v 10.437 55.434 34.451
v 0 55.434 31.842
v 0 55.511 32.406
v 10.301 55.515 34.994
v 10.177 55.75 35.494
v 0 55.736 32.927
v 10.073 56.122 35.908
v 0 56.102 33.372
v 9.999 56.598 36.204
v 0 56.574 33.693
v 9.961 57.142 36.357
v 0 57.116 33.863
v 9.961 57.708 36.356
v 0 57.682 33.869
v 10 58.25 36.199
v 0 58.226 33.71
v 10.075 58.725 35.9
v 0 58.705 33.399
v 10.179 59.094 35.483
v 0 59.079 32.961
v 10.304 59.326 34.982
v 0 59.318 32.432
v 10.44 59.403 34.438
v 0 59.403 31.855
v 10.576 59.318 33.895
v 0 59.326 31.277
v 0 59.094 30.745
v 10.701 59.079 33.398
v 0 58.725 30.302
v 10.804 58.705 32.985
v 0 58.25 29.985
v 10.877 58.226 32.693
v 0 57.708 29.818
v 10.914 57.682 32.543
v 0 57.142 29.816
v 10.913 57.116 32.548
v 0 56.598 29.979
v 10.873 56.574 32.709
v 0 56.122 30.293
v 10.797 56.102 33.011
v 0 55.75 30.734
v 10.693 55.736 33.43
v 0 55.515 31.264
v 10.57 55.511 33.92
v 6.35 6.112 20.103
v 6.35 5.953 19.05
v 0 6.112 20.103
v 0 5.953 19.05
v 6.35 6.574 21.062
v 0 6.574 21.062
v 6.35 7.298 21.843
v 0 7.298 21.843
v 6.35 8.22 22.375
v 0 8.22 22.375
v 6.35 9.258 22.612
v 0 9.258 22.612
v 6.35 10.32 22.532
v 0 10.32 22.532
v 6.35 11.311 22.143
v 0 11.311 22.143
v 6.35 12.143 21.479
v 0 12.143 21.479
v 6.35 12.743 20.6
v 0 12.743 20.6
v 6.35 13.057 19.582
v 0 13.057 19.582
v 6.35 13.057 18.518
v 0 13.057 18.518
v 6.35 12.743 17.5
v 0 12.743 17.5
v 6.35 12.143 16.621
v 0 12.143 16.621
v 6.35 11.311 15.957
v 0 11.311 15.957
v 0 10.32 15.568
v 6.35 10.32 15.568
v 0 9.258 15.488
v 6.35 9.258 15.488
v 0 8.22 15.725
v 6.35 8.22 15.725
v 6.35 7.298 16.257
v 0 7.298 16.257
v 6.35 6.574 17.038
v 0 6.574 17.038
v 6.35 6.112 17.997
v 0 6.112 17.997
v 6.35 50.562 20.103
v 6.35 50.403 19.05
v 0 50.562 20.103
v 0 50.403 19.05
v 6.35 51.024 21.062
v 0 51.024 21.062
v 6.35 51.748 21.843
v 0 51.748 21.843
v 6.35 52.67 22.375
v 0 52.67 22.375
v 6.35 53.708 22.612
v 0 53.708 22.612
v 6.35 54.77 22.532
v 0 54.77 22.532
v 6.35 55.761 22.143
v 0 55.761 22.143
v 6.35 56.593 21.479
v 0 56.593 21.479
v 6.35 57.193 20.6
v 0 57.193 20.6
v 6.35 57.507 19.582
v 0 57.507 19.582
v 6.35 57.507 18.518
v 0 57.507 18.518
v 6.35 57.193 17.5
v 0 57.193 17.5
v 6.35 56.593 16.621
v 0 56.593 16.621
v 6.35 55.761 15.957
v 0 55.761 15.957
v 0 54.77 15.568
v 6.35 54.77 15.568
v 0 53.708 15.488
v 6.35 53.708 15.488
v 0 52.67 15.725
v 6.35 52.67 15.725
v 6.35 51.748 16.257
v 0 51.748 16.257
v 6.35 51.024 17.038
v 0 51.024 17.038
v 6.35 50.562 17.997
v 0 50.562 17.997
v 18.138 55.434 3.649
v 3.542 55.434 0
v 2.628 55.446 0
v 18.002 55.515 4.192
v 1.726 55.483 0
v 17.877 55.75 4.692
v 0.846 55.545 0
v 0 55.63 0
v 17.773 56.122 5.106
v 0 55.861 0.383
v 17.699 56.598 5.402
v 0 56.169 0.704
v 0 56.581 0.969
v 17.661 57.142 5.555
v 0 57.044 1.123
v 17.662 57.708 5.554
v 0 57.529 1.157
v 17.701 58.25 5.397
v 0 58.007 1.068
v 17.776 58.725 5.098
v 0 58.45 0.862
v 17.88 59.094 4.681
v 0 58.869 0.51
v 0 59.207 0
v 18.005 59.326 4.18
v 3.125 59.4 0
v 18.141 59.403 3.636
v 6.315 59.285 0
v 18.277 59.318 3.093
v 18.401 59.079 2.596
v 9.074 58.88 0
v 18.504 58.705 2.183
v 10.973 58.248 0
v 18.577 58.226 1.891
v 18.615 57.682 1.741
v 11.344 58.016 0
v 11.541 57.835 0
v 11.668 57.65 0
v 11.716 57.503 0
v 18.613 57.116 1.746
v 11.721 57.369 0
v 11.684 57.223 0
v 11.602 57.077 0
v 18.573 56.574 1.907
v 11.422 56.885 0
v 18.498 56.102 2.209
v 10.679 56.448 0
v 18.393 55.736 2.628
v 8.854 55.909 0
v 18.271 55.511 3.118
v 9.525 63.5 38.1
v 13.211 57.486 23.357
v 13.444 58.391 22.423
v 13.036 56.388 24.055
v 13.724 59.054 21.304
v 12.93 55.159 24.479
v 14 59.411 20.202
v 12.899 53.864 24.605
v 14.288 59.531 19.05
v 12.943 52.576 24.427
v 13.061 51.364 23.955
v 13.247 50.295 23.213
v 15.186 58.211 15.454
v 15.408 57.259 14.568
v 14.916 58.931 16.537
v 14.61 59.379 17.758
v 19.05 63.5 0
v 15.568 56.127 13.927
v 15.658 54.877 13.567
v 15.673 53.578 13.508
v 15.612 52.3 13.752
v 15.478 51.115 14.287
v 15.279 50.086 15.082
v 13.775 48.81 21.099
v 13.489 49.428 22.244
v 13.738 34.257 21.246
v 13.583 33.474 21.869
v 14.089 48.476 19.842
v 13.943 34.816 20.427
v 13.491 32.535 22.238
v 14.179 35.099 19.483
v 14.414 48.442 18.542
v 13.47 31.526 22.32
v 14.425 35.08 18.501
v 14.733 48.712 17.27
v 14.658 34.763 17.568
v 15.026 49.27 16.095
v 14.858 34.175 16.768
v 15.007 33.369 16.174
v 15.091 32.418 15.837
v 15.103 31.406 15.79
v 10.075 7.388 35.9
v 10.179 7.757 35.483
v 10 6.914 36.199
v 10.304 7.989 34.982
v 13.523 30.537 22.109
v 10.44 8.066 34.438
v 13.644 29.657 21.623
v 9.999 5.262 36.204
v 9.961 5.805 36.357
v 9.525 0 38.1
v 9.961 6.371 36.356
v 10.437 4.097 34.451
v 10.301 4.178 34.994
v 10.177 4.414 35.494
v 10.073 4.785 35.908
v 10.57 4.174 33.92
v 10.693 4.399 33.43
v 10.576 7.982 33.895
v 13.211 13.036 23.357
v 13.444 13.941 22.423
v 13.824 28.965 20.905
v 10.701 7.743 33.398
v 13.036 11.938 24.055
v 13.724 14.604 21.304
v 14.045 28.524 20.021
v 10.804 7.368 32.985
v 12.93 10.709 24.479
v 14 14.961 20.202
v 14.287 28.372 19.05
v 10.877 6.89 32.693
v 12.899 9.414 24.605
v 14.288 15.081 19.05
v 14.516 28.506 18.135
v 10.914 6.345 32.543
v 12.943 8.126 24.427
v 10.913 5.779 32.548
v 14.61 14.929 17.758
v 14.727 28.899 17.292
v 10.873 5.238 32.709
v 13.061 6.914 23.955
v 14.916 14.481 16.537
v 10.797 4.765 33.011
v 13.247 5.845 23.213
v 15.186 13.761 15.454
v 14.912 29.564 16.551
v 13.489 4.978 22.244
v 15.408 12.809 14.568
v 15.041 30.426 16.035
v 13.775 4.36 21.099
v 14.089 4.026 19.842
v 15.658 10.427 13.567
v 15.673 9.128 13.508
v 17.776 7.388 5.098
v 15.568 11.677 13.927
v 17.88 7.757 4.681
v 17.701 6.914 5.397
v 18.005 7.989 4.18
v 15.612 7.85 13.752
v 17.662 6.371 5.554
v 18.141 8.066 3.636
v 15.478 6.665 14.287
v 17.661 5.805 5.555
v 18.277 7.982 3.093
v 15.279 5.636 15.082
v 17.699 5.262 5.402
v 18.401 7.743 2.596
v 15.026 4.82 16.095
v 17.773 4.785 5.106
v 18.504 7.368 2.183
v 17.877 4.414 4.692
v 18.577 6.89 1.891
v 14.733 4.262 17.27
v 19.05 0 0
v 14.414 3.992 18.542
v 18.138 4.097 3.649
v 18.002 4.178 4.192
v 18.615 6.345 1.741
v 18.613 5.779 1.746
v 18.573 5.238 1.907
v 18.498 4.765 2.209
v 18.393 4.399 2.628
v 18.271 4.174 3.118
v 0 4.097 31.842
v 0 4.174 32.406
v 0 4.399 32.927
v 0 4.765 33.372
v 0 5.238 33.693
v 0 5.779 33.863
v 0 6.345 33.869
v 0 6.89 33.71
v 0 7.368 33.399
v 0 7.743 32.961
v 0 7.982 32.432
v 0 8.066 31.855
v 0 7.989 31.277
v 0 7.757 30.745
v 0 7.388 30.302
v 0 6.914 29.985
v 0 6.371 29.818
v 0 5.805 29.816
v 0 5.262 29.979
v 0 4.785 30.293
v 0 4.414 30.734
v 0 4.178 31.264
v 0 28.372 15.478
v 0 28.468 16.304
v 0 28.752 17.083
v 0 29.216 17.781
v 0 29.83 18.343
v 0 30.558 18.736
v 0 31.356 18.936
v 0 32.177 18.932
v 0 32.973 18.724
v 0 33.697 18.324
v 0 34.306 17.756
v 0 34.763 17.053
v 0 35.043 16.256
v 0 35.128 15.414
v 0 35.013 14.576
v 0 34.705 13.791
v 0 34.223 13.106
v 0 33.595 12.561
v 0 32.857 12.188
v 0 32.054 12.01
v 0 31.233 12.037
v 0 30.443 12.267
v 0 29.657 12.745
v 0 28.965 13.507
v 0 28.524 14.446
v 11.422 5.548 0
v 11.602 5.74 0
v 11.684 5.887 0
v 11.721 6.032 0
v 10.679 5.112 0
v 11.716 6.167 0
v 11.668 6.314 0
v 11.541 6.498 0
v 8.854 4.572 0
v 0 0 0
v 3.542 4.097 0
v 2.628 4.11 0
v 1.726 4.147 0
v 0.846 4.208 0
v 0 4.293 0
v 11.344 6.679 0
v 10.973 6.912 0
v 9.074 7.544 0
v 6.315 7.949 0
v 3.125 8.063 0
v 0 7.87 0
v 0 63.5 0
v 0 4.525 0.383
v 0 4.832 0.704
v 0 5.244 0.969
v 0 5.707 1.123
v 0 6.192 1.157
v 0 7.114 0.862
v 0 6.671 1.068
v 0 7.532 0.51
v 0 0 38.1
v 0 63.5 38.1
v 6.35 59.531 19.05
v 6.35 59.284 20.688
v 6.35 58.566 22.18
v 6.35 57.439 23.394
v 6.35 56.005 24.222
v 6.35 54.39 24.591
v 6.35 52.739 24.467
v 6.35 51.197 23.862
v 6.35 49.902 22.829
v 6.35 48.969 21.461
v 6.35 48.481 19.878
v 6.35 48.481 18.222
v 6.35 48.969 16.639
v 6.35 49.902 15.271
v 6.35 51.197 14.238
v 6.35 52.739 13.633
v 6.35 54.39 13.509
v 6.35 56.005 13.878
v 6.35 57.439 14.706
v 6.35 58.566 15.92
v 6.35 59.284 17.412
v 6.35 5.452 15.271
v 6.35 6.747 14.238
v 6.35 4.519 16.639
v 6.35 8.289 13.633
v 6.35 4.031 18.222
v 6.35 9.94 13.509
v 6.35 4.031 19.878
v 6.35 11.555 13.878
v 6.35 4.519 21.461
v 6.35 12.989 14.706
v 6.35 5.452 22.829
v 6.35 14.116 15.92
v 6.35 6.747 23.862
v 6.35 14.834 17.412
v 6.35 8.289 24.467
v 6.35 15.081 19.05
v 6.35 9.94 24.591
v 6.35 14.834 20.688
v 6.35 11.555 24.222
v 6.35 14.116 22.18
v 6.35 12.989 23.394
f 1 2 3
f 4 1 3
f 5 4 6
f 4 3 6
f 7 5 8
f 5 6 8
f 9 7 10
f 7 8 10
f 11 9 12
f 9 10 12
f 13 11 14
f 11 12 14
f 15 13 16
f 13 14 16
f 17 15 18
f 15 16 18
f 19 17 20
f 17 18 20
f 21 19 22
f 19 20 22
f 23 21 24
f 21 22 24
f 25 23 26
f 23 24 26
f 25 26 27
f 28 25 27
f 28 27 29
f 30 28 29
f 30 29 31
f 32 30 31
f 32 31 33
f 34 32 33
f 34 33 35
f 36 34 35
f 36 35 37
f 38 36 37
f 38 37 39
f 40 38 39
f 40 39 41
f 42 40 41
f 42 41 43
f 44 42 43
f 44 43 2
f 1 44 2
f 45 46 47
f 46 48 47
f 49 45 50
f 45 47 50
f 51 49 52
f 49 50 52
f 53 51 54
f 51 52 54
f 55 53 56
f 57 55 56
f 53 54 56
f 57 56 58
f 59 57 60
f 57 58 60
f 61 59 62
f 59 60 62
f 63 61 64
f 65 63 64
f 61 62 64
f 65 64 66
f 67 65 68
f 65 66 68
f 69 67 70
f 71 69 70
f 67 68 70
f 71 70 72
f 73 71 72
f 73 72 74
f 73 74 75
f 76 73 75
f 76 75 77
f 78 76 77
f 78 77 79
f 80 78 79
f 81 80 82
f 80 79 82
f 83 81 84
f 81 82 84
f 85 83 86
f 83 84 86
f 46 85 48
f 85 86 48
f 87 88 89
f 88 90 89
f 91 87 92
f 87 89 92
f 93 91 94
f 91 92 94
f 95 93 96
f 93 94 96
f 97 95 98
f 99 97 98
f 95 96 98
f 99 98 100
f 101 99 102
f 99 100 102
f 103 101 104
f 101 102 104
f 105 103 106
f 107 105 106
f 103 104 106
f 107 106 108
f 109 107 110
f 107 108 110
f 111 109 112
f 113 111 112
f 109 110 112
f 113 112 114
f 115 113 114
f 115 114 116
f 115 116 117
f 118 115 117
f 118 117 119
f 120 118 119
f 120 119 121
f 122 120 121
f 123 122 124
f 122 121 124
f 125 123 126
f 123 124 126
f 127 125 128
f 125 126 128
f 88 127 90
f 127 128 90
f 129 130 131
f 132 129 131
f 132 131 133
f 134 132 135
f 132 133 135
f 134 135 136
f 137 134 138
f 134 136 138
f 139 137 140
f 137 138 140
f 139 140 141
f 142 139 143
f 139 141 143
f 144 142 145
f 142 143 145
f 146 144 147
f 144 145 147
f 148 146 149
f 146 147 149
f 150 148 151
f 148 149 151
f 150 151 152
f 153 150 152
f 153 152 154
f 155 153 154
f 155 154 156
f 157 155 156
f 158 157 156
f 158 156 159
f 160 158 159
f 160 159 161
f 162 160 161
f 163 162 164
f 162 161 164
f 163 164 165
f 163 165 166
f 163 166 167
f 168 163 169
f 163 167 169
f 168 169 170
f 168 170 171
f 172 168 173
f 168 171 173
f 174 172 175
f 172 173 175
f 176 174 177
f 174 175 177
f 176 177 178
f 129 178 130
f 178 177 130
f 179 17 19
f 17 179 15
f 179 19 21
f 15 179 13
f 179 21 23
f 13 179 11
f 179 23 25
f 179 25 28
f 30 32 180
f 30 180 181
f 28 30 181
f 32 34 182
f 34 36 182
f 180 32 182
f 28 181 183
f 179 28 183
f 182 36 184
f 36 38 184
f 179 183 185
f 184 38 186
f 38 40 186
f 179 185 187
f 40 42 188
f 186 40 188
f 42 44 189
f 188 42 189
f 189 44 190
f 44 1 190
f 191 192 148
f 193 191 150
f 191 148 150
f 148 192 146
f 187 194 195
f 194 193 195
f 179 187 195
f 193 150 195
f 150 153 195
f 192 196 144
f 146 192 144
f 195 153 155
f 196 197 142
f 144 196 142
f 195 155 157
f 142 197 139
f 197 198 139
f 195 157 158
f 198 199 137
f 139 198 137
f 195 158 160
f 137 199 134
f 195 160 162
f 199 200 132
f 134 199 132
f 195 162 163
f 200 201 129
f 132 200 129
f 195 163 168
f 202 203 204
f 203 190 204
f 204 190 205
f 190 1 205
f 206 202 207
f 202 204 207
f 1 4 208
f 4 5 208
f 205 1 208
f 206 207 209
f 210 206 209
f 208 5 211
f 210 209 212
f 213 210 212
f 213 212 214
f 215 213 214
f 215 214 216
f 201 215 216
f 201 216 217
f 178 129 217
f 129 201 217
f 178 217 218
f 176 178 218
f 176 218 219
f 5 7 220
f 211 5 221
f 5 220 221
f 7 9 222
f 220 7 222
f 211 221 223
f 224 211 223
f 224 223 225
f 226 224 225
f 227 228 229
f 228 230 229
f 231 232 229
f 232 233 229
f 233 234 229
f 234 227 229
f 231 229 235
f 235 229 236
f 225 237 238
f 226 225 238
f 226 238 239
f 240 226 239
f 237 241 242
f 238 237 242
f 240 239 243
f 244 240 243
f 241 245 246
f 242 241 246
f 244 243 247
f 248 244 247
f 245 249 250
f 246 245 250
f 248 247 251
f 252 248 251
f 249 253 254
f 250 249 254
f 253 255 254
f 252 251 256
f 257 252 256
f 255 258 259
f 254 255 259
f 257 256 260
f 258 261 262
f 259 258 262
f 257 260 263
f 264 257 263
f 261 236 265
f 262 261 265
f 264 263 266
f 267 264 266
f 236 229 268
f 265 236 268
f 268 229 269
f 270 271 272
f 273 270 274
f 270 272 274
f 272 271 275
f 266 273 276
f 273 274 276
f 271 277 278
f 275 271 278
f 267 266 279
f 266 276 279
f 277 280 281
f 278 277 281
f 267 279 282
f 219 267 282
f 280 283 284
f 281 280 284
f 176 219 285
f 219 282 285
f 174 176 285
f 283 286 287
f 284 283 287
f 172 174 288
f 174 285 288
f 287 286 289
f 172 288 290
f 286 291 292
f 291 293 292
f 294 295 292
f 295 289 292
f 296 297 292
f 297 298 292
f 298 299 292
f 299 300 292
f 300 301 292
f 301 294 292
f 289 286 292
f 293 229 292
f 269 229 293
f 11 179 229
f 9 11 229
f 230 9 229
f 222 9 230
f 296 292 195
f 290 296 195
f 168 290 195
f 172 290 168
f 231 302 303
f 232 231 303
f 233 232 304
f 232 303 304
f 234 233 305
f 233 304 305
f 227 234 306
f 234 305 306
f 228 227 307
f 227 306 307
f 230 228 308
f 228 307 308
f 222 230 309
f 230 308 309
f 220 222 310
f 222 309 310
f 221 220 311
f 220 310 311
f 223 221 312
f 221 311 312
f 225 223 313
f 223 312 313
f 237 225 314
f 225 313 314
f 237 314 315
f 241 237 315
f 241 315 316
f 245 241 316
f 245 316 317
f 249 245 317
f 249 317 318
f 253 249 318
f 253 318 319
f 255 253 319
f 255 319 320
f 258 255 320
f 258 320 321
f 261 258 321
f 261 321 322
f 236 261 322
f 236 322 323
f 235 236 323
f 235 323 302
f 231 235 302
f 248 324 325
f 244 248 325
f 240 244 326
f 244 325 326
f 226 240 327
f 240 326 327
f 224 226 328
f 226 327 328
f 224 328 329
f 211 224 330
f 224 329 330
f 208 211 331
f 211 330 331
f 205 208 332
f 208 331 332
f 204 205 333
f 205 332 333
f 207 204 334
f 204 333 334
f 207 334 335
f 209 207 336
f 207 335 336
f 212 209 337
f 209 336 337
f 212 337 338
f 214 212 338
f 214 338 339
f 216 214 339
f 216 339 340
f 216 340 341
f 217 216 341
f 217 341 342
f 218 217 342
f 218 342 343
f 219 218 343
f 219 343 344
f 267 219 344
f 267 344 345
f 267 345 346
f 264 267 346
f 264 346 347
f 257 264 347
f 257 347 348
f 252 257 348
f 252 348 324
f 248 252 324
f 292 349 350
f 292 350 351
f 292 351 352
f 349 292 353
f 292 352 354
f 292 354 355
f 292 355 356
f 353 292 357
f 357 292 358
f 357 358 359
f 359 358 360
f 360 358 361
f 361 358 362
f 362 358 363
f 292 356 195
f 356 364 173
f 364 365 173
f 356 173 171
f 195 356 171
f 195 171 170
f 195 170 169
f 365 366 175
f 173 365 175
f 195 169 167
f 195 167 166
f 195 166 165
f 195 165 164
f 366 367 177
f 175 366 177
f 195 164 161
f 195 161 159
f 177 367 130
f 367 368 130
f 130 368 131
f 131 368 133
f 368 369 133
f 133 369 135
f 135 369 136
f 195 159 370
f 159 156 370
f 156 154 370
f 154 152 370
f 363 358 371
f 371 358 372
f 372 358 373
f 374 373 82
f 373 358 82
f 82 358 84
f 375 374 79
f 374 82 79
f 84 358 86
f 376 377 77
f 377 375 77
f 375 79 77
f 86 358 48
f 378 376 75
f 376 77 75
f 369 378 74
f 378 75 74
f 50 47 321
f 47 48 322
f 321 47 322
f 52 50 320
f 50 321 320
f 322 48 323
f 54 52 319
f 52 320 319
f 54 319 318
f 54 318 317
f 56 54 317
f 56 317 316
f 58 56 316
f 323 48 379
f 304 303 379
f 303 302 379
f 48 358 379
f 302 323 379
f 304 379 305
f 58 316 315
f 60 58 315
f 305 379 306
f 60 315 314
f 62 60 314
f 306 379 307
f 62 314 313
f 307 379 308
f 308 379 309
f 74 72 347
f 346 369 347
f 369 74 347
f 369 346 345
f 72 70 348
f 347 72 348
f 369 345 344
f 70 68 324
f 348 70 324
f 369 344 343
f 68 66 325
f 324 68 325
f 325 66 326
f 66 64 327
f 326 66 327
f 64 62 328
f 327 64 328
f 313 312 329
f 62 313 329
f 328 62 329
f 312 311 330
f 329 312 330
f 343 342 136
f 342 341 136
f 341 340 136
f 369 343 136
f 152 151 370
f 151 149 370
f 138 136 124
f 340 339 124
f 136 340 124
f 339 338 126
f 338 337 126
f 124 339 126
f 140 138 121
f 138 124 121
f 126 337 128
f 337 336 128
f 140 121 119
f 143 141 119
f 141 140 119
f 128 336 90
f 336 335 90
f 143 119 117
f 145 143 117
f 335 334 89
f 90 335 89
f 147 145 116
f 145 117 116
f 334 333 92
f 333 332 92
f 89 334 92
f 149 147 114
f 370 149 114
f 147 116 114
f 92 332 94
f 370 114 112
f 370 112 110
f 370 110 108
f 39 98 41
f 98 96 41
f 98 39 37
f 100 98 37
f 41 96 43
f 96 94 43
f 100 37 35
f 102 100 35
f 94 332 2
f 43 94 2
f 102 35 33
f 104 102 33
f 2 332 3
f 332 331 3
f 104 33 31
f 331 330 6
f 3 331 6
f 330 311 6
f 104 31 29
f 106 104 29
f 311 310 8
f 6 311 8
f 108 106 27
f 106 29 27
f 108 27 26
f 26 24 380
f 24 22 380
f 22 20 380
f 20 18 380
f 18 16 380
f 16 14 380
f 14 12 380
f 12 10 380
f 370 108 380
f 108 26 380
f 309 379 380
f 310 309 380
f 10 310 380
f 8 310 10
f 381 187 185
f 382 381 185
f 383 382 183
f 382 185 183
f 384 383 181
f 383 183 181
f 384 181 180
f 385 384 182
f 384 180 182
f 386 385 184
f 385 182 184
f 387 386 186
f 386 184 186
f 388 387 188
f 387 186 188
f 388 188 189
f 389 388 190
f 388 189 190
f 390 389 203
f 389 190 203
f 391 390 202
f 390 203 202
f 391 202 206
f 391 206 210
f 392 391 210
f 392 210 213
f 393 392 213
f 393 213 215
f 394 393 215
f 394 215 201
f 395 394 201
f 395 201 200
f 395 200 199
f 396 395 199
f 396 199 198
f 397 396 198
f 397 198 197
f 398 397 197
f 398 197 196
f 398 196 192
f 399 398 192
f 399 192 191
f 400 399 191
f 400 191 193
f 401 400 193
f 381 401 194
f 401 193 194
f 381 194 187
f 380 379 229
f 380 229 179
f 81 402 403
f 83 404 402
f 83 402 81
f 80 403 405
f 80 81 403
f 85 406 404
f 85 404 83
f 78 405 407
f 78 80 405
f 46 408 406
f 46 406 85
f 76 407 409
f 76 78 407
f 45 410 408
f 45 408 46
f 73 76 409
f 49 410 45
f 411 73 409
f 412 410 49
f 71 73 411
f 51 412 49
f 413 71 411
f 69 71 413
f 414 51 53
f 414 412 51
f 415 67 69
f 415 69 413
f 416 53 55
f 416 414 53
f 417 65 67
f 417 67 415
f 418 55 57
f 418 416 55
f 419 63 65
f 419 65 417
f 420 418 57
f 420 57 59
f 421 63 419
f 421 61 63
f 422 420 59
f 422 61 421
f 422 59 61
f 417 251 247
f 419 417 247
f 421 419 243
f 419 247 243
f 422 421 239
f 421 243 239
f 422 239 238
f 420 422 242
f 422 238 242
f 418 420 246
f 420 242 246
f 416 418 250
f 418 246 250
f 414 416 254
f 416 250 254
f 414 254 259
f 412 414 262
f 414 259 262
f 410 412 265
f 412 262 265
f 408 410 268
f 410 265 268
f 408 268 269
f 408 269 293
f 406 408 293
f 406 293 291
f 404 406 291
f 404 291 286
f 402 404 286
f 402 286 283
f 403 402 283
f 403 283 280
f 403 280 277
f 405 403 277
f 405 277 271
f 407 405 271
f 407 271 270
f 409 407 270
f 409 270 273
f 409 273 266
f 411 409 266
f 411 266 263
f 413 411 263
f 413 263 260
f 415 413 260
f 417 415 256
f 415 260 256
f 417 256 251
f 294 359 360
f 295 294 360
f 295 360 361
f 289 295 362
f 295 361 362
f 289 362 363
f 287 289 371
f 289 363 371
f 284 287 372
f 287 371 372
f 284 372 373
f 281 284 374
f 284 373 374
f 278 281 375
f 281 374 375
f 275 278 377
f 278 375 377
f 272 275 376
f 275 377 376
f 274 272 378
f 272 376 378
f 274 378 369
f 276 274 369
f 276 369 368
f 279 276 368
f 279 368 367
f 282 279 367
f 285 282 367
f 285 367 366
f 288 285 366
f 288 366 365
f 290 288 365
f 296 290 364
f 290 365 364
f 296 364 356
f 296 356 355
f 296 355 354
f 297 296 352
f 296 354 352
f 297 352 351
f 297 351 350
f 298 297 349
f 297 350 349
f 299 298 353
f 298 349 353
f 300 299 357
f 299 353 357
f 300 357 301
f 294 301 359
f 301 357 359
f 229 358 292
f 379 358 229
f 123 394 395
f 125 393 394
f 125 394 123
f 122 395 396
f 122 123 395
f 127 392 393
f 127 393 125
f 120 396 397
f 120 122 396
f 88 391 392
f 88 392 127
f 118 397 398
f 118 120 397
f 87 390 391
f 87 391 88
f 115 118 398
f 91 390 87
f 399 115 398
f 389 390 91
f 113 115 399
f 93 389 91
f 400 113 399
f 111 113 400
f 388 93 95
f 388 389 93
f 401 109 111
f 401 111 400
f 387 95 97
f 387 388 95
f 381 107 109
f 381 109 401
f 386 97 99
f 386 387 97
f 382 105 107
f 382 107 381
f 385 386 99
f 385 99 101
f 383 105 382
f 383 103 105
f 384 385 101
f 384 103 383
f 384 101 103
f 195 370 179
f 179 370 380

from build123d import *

# Parameters (mm, degrees)
F0_W           = 63.5
F0_H           = 38.1
F1_DEPTH       = 19.05
F3_D           = 7.14375
F3_CBORE_D     = 11.1125
F3_CBORE_DEPTH = 12.7
F5_DEPTH       = 63.501
F7_D           = 6.7564
F9_D           = 3.96875


with BuildPart() as f1:
    # F0 (on Right) → F1 (new body)
    with BuildSketch(Plane.YZ):
        with Locations((31.75, 19.05)):
            Rectangle(F0_W, F0_H)
    extrude(amount=F1_DEPTH)

    # F3 (through all)
    with Locations(Plane.YZ.offset(19.05)):
        with Locations((9.525, 19.05), (53.975, 19.05)):
            CounterBoreHole(F3_D / 2, F3_CBORE_D / 2, F3_CBORE_DEPTH)

    # F4 (on face) → F5 (cut, through all)
    with BuildSketch(Plane.XZ):
        Polygon((19.05, 38.1), (9.525, 38.1), (19.05, 0), align=None)
    extrude(amount=-F5_DEPTH, mode=Mode.SUBTRACT)

    # F7 (through all)
    with Locations(Plane(origin=(17.929412, 0, 4.482353), x_dir=(0, 1, 0), z_dir=(0.970143, 0, 0.242536))):
        with Locations((31.75, 15.015987)):
            Hole(F7_D / 2)

    # F9 (through all)
    with Locations(Plane(origin=(17.929412, 0, 4.482353), x_dir=(0, 1, 0), z_dir=(0.970143, 0, 0.242536))):
        with Locations((6.081646, 30.890987), (57.418354, 30.890987), (57.418354, -0.859013), (6.081646, -0.859013)):
            Hole(F9_D / 2)


solid = f1.part
